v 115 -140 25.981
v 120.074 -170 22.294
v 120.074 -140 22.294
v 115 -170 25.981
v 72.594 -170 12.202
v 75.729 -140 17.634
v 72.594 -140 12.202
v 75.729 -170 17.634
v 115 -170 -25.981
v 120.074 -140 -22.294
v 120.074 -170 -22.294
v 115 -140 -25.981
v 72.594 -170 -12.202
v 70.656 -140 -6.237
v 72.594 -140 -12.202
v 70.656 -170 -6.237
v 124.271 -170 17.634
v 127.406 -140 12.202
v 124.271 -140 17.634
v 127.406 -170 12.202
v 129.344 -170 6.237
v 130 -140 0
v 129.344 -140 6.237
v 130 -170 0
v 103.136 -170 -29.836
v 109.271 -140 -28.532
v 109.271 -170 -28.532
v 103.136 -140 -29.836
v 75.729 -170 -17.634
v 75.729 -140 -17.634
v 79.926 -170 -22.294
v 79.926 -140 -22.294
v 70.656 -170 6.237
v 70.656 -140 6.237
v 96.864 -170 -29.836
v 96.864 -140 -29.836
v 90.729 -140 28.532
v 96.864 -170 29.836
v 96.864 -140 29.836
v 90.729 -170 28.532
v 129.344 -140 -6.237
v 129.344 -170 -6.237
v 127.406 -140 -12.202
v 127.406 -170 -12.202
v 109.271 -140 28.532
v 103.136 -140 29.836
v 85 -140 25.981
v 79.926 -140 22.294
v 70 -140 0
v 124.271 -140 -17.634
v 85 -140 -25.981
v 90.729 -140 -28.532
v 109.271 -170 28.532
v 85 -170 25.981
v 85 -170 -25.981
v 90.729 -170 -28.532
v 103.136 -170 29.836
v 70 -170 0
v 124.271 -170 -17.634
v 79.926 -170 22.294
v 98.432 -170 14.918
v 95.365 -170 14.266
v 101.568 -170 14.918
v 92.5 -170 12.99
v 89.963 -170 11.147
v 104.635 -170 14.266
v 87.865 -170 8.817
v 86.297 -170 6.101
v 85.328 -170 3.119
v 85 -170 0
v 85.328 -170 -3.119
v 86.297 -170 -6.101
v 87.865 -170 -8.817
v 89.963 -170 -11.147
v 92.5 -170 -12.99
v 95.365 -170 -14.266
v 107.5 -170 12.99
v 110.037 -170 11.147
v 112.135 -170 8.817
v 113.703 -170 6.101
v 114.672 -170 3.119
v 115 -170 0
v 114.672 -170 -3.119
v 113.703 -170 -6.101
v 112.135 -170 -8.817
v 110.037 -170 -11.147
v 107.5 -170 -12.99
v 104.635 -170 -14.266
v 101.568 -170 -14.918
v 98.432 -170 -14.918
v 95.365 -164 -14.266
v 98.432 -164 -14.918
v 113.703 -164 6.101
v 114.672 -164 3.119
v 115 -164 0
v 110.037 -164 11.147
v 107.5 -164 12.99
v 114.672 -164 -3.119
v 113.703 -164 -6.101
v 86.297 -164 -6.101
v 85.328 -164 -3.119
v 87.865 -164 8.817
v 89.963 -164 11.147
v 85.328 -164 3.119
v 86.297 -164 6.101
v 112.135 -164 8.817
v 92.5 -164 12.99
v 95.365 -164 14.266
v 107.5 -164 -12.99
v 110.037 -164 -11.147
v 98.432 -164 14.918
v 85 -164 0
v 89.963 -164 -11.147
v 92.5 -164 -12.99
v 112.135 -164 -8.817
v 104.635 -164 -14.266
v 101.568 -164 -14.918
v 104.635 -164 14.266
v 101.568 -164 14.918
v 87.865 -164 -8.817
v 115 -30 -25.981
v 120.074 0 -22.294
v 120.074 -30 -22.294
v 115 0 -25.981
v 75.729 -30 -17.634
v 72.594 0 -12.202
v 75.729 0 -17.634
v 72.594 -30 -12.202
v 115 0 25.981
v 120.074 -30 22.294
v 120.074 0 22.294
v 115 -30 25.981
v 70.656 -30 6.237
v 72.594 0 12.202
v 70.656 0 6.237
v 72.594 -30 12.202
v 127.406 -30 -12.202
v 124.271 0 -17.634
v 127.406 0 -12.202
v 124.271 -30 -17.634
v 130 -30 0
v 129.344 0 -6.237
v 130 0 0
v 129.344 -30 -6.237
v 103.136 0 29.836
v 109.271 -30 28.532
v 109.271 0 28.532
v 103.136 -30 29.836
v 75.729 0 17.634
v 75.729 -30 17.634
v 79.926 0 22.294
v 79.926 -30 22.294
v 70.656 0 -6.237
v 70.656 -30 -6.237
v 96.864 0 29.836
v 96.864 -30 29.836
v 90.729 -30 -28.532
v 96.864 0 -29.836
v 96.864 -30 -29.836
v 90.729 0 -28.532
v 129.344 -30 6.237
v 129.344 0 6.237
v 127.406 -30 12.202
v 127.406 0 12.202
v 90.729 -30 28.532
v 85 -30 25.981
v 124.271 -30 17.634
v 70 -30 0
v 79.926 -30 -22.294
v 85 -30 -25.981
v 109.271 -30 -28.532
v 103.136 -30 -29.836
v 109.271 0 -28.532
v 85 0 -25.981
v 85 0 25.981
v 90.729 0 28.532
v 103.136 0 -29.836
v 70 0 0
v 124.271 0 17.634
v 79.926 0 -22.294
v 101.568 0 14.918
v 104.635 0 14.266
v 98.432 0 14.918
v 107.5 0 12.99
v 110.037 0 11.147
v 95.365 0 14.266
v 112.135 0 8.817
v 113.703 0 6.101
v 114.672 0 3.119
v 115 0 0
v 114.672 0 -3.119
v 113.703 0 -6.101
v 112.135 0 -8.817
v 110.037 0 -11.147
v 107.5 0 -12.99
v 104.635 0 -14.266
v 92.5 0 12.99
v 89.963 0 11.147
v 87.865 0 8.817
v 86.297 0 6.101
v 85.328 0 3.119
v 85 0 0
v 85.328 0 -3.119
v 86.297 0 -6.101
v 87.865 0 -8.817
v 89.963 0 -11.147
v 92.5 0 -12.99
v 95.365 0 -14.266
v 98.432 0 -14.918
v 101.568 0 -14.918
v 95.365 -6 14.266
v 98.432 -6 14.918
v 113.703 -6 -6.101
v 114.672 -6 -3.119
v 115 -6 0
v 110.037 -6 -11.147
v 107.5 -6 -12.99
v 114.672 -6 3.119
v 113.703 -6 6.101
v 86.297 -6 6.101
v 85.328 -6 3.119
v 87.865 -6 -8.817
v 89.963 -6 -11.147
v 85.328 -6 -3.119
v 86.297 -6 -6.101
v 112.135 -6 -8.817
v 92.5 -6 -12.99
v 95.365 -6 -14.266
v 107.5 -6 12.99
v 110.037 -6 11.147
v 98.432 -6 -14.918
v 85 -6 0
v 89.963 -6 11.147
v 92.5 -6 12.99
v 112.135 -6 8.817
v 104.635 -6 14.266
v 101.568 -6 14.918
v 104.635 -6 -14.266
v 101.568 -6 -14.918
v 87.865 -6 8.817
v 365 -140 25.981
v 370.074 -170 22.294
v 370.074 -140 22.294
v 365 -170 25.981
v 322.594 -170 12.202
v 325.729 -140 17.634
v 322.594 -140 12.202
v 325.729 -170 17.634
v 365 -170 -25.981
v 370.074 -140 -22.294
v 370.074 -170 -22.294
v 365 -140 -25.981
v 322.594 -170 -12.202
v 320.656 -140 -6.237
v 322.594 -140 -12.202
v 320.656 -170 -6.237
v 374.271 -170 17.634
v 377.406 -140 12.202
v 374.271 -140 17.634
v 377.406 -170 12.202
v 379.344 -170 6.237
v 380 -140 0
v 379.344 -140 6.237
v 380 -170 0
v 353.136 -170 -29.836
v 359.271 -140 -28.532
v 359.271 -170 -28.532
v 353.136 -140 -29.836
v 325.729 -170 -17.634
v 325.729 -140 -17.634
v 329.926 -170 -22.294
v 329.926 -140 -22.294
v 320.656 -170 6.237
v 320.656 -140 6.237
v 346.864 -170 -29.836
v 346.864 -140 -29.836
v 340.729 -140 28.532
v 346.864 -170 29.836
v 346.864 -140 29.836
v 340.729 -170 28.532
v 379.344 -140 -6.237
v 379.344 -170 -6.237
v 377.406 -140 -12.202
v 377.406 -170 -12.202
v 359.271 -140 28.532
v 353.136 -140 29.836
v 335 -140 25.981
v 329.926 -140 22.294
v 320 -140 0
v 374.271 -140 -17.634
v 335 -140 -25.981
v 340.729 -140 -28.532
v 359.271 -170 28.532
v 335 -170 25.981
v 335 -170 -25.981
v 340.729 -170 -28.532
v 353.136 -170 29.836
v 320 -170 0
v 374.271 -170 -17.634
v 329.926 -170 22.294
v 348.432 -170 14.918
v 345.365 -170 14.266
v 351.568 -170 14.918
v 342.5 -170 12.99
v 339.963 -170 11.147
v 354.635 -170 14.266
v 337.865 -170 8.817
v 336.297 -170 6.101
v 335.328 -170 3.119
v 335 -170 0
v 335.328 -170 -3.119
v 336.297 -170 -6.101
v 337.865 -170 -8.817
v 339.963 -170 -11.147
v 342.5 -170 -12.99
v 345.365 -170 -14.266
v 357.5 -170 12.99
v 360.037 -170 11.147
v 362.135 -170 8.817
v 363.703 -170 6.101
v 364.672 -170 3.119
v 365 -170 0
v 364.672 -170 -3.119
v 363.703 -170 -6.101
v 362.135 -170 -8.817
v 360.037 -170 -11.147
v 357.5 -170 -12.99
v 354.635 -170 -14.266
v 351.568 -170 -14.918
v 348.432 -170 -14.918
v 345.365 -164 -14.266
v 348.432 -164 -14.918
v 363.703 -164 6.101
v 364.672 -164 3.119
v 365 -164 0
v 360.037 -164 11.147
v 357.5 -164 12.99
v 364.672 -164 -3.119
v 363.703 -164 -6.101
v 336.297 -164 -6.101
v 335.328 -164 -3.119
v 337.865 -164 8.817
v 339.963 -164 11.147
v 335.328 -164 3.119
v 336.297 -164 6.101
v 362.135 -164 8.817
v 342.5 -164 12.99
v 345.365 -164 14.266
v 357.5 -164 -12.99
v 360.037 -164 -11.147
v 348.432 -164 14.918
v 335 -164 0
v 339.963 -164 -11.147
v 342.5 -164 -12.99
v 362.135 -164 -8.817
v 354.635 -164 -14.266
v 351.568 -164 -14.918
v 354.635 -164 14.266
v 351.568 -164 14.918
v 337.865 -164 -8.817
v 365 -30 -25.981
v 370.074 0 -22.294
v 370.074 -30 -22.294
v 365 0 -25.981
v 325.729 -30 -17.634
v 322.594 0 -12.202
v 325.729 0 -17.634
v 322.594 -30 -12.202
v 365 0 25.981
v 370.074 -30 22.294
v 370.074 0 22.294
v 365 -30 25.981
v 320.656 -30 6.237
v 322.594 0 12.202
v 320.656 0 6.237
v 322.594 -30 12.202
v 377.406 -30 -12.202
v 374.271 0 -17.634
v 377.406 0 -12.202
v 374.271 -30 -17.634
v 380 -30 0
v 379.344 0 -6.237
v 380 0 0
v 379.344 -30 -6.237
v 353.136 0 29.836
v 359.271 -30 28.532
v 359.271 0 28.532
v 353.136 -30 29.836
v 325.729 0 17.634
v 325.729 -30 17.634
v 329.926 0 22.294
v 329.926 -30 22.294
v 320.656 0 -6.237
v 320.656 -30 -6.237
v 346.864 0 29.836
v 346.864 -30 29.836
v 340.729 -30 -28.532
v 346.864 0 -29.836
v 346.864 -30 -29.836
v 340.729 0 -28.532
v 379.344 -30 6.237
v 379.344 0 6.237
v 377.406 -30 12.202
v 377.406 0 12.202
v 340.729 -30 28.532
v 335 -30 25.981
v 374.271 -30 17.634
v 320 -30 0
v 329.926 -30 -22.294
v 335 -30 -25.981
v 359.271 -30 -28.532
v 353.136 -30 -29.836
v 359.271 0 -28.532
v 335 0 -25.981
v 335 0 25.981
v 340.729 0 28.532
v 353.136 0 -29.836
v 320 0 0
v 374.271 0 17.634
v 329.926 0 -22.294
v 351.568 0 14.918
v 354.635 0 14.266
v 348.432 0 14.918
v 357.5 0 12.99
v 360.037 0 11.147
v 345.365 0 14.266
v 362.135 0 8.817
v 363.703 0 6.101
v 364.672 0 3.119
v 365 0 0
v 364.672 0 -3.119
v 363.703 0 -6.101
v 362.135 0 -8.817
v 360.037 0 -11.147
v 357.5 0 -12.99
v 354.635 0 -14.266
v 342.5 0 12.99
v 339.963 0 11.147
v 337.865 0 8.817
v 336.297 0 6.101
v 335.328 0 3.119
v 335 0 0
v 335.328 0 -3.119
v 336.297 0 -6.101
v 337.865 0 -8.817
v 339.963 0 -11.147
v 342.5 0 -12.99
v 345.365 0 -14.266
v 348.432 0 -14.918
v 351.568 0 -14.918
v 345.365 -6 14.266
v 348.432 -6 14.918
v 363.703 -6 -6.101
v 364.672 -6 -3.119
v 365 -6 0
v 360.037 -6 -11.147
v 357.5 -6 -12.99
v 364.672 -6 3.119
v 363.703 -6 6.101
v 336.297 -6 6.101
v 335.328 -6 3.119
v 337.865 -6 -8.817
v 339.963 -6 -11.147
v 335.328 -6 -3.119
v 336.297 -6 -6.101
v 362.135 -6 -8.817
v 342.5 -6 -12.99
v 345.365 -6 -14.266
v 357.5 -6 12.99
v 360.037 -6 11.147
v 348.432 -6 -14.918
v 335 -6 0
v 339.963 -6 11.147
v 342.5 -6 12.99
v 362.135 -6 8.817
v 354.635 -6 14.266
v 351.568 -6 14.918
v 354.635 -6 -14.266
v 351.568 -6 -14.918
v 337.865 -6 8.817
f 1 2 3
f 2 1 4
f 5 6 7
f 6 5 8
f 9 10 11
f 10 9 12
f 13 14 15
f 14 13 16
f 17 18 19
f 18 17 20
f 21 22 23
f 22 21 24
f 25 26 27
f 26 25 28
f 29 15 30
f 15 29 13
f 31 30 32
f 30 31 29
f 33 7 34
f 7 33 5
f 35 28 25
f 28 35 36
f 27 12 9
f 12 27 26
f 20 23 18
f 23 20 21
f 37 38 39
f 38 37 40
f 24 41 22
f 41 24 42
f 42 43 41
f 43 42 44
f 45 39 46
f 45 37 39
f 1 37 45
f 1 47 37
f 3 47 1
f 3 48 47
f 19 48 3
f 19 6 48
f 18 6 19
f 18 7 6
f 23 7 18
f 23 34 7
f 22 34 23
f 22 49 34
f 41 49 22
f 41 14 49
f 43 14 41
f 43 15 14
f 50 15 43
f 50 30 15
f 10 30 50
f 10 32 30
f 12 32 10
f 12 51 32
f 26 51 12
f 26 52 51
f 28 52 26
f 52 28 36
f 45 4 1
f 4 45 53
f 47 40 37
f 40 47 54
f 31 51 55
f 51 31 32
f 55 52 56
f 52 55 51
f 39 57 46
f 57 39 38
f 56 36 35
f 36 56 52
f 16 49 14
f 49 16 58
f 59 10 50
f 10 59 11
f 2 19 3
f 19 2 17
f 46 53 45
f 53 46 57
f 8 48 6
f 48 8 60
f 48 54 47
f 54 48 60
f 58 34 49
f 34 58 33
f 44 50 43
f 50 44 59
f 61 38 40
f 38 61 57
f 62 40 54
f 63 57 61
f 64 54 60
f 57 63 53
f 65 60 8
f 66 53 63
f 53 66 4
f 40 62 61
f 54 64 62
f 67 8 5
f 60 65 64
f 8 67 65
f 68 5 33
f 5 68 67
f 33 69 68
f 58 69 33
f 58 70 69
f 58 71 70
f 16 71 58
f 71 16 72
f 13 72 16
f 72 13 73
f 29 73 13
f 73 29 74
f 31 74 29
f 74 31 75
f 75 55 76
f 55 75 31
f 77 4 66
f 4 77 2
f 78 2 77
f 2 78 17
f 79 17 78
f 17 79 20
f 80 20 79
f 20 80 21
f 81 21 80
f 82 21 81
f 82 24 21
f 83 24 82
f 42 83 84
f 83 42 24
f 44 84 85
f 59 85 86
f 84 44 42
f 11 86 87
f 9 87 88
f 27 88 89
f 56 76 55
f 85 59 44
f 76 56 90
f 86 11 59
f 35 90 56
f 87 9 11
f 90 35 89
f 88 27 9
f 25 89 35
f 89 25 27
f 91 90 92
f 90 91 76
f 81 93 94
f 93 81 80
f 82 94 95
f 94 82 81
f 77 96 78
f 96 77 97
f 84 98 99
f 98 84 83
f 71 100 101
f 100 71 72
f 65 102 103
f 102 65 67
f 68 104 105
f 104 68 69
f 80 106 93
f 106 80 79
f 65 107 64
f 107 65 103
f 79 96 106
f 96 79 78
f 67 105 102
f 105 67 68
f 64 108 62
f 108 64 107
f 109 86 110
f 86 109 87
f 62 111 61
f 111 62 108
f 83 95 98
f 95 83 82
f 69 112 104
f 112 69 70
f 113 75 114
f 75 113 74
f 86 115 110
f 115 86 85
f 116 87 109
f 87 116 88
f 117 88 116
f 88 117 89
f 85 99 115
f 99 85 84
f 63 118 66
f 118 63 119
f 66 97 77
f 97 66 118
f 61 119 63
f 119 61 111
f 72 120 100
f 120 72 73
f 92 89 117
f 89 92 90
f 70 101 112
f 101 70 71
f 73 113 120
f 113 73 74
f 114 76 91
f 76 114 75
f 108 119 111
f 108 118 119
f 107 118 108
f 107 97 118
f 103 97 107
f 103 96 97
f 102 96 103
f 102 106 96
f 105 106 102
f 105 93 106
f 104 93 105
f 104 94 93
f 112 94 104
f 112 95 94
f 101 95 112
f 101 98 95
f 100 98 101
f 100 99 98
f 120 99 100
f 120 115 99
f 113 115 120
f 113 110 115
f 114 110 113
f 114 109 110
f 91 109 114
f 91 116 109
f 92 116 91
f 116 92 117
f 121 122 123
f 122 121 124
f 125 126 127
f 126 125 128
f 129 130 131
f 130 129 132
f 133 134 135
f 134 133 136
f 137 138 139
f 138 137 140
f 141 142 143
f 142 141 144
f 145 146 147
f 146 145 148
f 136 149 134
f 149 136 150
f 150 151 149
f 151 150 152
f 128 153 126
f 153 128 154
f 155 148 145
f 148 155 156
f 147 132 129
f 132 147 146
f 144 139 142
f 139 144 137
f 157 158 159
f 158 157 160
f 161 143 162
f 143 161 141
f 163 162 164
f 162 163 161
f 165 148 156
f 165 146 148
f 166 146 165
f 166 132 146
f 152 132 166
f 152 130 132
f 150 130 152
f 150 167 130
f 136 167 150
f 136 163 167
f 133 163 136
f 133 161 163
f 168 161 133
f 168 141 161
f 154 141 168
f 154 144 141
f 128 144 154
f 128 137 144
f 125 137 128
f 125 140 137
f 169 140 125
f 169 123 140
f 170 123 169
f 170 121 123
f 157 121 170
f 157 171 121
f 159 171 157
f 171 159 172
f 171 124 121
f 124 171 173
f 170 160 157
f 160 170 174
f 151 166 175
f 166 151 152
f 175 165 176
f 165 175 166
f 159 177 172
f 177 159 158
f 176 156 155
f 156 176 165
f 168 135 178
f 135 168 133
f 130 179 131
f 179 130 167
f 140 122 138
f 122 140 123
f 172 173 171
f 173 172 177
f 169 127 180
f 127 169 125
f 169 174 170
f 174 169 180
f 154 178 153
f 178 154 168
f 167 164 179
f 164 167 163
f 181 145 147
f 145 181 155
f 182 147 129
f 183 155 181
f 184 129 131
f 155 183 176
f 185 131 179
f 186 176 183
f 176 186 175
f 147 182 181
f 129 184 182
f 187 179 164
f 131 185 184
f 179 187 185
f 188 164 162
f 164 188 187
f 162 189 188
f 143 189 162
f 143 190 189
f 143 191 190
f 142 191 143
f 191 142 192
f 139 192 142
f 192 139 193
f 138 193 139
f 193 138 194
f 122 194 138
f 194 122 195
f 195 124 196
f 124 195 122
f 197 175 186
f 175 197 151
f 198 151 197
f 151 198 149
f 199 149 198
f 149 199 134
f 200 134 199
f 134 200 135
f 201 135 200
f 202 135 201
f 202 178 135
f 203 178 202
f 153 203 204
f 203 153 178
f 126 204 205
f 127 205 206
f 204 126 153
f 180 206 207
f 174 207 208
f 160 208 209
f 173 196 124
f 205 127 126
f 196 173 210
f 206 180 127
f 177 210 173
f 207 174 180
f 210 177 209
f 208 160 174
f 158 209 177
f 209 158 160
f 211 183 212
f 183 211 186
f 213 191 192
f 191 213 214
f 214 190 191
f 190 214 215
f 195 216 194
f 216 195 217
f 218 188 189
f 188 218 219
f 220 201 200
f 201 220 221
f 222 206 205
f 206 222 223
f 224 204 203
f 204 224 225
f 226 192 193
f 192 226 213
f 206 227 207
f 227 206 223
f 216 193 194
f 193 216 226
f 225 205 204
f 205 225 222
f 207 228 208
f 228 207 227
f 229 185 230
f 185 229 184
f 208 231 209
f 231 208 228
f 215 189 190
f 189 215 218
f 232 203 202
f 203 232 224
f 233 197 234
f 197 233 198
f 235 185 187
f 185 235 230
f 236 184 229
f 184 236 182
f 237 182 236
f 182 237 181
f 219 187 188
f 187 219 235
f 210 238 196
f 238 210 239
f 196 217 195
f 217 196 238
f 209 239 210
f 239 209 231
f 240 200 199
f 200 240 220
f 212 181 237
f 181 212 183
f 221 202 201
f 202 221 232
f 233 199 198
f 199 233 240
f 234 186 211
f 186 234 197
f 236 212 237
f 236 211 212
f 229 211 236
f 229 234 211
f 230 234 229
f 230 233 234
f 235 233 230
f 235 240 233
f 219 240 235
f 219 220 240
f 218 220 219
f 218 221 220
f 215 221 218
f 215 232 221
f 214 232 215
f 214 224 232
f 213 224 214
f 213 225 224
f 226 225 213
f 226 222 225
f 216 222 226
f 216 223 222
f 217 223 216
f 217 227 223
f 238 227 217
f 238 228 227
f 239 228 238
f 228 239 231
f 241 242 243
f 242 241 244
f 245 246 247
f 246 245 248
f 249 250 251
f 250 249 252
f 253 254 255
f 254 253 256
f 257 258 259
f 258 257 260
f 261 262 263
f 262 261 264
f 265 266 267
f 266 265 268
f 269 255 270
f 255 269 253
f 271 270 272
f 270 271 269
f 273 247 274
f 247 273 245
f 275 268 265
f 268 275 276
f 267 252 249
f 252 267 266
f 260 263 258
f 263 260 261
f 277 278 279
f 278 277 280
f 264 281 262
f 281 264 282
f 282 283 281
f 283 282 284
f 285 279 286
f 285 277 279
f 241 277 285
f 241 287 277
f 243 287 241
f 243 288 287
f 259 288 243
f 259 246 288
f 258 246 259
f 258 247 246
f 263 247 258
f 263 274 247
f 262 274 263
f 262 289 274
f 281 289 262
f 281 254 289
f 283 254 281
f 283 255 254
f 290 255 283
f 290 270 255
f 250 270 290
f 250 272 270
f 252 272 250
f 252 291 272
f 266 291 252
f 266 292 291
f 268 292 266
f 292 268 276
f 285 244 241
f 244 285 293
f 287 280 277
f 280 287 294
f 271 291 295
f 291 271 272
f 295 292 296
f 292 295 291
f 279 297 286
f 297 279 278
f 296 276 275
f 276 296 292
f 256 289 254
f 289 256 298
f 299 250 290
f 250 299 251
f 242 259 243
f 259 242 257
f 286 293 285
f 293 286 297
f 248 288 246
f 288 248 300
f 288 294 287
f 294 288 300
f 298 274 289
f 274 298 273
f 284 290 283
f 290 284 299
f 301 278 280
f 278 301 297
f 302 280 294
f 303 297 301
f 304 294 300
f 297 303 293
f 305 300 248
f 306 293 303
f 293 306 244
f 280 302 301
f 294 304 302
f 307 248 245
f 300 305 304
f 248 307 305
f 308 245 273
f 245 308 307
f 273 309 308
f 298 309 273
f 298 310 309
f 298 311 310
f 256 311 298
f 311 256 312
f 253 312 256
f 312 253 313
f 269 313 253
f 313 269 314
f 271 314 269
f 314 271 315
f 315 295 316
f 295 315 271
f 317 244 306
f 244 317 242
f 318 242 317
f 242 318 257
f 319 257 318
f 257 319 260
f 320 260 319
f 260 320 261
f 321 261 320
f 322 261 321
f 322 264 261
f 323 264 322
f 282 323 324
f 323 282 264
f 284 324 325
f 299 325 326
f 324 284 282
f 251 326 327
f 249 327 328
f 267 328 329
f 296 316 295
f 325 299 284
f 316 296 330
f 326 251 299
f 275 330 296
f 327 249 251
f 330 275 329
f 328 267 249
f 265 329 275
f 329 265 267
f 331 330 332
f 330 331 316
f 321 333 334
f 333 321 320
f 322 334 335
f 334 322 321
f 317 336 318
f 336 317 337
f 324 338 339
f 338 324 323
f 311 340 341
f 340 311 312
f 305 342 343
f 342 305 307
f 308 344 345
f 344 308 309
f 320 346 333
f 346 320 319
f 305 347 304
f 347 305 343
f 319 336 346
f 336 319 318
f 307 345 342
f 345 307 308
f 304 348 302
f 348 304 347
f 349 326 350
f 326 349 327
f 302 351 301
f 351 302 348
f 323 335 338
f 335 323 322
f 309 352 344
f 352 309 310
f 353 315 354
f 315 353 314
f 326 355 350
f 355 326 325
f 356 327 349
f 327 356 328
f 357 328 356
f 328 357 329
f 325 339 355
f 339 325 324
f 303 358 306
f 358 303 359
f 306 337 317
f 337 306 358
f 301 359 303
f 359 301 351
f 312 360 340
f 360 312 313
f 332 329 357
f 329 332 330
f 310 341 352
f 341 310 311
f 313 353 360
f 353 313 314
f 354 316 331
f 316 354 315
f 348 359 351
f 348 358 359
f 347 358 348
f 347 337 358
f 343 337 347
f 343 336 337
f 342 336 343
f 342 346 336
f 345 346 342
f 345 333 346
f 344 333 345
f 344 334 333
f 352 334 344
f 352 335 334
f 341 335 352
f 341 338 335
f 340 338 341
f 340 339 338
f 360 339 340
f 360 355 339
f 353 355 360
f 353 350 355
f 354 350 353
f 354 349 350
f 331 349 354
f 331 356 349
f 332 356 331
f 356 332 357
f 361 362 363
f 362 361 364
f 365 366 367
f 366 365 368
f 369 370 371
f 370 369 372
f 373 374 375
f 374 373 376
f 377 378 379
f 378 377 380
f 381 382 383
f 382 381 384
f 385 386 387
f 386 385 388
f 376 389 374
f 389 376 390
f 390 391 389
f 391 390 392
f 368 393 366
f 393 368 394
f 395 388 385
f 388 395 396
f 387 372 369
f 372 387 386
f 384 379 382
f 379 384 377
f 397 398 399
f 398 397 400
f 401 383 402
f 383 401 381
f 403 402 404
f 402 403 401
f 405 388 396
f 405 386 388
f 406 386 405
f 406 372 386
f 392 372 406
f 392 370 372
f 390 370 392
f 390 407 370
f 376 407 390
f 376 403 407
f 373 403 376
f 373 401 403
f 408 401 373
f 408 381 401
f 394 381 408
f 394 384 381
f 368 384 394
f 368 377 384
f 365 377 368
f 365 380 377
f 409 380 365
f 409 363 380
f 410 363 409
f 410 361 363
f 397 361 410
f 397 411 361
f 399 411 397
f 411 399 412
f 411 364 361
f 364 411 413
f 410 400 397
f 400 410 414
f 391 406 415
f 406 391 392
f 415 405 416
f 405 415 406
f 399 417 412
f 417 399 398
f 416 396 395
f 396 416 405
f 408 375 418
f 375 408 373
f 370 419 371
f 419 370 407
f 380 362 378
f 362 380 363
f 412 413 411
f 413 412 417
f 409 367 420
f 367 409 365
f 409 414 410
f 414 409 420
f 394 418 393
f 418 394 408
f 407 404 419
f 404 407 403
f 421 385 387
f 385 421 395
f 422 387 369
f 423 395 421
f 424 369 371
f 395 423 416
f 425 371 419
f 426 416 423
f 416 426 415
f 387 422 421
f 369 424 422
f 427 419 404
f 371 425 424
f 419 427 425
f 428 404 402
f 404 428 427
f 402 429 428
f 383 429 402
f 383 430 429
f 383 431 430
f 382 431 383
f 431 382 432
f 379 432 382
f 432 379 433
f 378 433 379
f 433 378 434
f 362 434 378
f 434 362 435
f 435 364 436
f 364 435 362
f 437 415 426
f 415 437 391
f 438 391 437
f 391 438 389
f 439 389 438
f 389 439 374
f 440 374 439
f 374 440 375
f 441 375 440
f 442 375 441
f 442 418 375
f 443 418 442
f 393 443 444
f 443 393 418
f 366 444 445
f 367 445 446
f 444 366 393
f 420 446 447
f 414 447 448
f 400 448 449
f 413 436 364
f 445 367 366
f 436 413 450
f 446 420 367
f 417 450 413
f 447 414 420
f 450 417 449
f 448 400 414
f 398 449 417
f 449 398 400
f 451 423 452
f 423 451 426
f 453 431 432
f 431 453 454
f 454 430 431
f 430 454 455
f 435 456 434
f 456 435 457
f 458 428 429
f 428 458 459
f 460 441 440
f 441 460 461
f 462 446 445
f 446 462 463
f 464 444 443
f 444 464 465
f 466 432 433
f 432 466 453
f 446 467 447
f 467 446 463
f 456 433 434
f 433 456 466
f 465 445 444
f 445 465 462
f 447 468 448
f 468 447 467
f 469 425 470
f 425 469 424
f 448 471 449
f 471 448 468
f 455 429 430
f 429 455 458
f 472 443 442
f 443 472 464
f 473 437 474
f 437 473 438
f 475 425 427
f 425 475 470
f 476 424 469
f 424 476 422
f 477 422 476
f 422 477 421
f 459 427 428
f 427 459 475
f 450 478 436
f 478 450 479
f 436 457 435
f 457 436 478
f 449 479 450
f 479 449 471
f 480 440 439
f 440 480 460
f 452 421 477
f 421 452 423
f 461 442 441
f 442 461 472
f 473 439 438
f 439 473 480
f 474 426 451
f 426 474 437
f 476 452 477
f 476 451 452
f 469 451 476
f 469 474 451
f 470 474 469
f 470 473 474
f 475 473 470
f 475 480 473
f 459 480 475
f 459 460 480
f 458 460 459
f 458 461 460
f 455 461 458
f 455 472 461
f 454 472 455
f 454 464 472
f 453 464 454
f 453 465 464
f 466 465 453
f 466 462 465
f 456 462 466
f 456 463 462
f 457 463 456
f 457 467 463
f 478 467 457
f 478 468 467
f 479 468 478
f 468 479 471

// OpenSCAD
$fn=30;
module car(){
    dx = 100.0;
    dx2 = 350.0;
    color([0.870, 0.176, 0.149])
    difference(){
    intersection(){
    rotate([90, 0, 0])
    linear_extrude(height=200.0)
    import(file = "side.dxf");
    
    translate([0, -160, 0])
    rotate([90, 0, 90])
    linear_extrude(height=500.0)
    import(file = "front.dxf");
    }
    
    translate([140.0, 0, 50.0])
    rotate([90, 0, 0])
    linear_extrude(height=200.0)
    import(file = "windows.dxf");
    
    translate([dx, 0, 0])
    rotate([90, 0, 0])
    cylinder(300.0, 30.0, 30.0);
    
    translate([dx2, 0, 0])
    rotate([90, 0, 0])
    cylinder(300.0, 30.0, 30.0);
}
    translate([dx, -140.0, 0])
    tire(30.0, 30.0);
    
    translate([dx, -30.0, 0])
    rotate([180, 0, 0])
    tire(30.0, 30.0);

    translate([dx2, -140.0, 0])
    tire(30.0, 30.0);
    
    translate([dx2, -30.0, 0])
    rotate([180, 0, 0])
    tire(30.0, 30.0);
    //tire(30.0, 30.0);
}

module tire(thickness, radius)
{
    color([0.1, 0.1, 0.1])
    difference(){
    rotate([90, 0, 0])
    cylinder(thickness, radius, radius);
    
    translate([0, 0.5*thickness, 0])
    rotate([90, 0, 0])
    cylinder(2*thickness, 0.5*radius, 0.5*radius);
    }
    
    color([0.6, 0.6, 0.6])
    rotate([90, 0, 0])
    cylinder(0.8*thickness, 0.5*radius, 0.5*radius);
}

module road()
{
    color([0.3, 0.3, 0.3])
    scale([2, 1, 2])
    translate([320, -300, -270])
    rotate([90, 0, 180])
    linear_extrude(height=400.0)
    import(file = "road.dxf");
}
car();
road();
